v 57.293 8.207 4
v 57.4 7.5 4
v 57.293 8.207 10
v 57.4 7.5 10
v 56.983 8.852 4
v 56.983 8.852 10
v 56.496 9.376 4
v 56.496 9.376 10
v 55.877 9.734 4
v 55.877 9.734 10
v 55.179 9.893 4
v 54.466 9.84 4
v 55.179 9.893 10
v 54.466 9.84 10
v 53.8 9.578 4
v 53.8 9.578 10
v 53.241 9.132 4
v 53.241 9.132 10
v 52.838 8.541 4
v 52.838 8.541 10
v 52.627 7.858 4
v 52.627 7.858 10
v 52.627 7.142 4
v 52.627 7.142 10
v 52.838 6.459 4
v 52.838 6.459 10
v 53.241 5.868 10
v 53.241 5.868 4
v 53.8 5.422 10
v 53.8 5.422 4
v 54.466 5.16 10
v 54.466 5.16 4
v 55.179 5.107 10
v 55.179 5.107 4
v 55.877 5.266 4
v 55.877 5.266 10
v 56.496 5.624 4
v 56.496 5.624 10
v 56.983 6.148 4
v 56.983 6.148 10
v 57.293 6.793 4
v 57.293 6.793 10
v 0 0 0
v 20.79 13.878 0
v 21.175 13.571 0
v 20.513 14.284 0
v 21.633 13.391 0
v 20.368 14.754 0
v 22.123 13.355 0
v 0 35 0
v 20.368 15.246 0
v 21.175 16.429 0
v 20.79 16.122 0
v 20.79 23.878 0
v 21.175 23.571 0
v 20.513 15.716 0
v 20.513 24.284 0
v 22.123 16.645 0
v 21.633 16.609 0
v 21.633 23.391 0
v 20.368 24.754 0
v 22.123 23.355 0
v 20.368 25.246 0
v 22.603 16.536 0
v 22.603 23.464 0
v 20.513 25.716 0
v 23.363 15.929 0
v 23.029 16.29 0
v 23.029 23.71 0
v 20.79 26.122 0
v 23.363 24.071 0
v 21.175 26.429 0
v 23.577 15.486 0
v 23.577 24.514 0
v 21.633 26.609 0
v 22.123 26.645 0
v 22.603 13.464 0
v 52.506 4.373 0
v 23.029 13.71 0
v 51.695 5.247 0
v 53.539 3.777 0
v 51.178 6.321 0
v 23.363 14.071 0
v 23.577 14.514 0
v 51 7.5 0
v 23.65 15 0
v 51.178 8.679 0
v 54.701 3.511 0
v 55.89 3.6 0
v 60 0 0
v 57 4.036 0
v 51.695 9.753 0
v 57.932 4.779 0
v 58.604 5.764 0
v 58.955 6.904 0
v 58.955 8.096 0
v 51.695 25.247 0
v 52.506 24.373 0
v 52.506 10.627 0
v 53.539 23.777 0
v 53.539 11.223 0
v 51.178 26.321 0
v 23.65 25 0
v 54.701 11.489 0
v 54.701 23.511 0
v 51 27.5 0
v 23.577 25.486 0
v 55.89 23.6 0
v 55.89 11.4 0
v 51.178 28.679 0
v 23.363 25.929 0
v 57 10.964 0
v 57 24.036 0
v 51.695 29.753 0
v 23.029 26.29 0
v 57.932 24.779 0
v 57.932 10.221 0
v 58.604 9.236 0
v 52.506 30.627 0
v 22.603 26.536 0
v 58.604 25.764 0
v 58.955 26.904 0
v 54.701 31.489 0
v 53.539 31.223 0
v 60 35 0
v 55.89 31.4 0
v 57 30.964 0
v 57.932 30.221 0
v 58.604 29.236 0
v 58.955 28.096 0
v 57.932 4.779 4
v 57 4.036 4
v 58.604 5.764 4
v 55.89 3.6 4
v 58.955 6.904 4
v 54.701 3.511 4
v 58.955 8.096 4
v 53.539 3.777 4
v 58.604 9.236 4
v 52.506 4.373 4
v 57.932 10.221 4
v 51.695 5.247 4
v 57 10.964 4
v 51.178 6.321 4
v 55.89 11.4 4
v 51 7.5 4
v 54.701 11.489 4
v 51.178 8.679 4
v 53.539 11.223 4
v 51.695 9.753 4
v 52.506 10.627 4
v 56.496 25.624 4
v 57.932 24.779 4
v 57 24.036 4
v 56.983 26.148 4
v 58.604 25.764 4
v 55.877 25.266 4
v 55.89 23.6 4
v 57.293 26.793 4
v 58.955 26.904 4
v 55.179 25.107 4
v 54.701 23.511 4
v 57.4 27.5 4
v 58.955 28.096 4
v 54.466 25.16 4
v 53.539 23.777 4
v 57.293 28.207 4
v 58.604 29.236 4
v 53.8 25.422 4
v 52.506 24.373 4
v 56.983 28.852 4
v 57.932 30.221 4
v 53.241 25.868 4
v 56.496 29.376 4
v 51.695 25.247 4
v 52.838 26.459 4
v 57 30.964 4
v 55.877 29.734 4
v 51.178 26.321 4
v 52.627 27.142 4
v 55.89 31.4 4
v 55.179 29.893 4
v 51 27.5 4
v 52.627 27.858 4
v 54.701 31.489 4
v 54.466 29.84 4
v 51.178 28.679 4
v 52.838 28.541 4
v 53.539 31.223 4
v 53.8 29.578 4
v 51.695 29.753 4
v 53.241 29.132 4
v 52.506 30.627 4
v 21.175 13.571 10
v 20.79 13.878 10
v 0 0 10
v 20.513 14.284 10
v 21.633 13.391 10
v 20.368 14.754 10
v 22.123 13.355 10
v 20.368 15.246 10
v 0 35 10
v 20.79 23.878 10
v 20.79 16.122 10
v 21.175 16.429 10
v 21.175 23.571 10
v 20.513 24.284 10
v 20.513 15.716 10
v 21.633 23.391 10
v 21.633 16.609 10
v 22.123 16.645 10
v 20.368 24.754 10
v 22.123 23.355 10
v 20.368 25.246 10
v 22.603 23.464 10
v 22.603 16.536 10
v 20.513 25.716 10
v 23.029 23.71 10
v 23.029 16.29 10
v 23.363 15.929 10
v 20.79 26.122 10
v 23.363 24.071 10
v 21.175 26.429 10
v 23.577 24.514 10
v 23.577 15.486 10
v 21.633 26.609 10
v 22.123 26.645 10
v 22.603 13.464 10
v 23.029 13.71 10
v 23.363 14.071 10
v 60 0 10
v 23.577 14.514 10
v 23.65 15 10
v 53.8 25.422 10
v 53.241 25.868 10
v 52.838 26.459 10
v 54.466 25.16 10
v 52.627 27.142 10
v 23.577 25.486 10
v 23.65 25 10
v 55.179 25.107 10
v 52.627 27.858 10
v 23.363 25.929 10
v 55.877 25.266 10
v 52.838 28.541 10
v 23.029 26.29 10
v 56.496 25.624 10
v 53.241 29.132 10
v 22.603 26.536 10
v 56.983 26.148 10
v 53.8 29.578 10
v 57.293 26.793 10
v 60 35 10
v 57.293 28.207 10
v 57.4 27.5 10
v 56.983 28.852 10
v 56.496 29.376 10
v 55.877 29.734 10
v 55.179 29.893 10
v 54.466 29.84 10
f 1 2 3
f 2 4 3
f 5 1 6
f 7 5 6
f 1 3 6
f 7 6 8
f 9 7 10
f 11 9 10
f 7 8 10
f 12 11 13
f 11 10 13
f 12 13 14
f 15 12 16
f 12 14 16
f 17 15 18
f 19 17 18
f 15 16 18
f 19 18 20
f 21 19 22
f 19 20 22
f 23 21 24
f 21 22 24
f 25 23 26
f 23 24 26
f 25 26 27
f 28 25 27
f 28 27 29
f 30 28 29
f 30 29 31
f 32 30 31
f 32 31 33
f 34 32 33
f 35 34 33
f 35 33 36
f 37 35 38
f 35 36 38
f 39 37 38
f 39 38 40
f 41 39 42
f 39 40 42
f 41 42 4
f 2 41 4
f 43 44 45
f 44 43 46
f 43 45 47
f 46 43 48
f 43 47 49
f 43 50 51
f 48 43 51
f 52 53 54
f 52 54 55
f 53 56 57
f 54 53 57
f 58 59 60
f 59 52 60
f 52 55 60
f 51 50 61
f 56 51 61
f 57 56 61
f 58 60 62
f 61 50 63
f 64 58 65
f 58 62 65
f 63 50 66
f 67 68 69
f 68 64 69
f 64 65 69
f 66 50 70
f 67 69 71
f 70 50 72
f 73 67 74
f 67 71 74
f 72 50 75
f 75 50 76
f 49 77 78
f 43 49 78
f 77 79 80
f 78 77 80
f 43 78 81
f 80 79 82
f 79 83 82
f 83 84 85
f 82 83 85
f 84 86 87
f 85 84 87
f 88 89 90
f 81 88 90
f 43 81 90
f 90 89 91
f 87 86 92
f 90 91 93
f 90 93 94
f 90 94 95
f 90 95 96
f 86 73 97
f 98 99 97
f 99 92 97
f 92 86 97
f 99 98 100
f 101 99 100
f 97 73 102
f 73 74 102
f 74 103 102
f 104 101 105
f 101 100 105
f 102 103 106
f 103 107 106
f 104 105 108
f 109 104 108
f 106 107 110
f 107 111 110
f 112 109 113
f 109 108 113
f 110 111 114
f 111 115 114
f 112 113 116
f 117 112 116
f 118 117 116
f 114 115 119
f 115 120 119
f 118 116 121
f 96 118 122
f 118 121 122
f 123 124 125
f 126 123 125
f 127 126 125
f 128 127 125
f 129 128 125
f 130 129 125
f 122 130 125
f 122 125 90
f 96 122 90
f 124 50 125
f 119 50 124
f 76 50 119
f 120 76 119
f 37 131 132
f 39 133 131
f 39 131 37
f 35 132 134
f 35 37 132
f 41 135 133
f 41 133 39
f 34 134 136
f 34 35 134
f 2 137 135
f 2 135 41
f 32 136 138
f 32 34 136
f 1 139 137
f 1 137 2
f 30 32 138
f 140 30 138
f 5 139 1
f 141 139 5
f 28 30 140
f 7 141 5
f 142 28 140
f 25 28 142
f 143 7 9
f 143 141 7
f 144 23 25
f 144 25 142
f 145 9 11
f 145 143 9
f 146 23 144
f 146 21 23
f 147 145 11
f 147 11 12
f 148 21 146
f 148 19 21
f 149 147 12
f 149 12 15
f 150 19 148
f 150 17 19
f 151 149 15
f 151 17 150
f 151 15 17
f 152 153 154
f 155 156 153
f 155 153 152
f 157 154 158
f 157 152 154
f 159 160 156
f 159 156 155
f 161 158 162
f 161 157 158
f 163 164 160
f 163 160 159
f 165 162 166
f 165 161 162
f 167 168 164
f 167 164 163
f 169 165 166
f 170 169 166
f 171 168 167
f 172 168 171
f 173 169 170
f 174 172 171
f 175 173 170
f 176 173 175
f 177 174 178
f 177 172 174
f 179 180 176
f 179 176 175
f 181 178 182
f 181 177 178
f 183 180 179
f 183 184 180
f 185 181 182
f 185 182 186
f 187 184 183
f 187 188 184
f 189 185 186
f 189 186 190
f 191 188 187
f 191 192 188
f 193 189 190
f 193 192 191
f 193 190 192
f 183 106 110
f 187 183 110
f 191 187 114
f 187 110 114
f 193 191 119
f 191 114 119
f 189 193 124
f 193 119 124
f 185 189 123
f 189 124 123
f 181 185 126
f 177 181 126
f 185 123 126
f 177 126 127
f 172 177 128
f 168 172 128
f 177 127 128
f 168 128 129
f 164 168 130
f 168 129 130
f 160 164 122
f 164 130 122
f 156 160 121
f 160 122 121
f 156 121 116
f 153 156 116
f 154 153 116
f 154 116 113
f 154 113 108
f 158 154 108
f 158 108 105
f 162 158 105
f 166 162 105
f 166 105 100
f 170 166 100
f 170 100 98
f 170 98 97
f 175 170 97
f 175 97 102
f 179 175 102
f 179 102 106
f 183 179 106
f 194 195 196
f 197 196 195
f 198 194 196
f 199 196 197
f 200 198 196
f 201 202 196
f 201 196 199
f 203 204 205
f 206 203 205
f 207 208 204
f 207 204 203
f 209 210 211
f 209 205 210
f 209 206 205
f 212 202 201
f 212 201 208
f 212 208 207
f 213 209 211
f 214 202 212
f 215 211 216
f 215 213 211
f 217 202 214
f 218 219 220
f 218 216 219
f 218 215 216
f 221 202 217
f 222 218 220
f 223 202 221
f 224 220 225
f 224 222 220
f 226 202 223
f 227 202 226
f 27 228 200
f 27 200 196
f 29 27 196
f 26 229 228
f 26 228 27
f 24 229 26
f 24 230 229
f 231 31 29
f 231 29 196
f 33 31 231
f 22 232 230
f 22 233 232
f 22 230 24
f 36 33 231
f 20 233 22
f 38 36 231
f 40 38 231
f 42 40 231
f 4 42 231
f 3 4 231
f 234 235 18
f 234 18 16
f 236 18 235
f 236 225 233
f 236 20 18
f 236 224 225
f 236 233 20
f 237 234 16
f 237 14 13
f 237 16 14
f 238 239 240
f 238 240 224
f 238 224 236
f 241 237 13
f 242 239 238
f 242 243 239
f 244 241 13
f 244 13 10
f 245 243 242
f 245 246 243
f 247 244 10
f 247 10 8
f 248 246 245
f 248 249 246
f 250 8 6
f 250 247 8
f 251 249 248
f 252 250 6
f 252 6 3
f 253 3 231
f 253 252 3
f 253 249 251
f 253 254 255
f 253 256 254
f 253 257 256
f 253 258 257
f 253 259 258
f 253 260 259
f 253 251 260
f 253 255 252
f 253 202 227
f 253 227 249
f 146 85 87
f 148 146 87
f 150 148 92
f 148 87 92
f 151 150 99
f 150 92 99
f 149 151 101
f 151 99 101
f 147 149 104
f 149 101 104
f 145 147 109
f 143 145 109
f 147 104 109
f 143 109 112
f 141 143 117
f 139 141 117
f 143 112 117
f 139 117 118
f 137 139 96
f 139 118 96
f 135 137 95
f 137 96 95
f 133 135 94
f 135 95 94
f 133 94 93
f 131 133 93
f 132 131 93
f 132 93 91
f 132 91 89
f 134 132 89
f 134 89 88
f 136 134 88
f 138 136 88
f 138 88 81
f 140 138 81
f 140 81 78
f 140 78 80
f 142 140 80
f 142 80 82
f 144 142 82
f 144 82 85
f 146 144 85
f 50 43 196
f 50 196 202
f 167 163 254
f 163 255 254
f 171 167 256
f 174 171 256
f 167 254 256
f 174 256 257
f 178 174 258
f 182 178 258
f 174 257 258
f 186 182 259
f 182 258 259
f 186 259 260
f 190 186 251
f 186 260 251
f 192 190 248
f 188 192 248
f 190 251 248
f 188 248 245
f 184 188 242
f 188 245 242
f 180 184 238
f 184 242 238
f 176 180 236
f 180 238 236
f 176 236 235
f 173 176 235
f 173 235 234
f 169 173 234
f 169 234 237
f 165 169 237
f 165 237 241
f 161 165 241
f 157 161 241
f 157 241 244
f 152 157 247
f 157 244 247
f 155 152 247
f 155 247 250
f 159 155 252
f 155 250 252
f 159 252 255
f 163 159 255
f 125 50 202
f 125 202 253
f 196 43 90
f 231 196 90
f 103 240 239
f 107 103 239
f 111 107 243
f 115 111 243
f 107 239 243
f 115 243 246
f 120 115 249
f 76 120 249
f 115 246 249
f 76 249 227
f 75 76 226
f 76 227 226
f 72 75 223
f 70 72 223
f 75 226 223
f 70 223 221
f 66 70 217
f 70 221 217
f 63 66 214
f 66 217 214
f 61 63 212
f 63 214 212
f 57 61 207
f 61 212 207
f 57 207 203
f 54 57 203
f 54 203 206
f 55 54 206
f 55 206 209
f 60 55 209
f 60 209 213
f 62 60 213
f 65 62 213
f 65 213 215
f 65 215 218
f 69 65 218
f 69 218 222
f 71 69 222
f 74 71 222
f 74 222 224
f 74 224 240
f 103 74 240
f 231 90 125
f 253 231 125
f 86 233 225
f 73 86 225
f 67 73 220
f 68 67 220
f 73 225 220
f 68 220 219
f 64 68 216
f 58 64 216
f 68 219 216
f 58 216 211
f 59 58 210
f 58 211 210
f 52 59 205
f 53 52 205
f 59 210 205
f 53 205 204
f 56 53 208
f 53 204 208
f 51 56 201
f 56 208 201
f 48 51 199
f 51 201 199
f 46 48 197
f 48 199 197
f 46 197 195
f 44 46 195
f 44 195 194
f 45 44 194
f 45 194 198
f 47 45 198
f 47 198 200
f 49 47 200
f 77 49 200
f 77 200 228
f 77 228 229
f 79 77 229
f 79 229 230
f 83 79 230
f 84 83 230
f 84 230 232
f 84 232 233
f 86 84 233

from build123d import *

# Parameters (mm, degrees)
SKETCH_1_W                   = 60
SKETCH_1_H                   = 35
EXTRUDE_1_DEPTH              = 10
HOLE_WIZARD_M4_1_D           = 4.8
HOLE_WIZARD_M4_1_CBORE_D     = 8
HOLE_WIZARD_M4_1_CBORE_DEPTH = 4
HOLE_WIZARD_M4_1_2_D         = 3.3


with BuildPart() as part:
    # 草图1 → 凸台-拉伸1 (new body)
    with BuildSketch(Plane.XY):
        with Locations((30, 17.5)):
            Rectangle(SKETCH_1_W, SKETCH_1_H)
    extrude(amount=EXTRUDE_1_DEPTH)

    # Hole Wizard M4 _1 (through all)
    with Locations(Plane(origin=(0, 0, 0), x_dir=(-1, 0, 0), z_dir=(0, 0, -1))):
        with Locations((-55, 7.5), (-55, 27.5)):
            CounterBoreHole(HOLE_WIZARD_M4_1_D / 2, HOLE_WIZARD_M4_1_CBORE_D / 2, HOLE_WIZARD_M4_1_CBORE_DEPTH)

    # Hole Wizard M4 _1 2 (through all)
    with Locations(Plane(origin=(0, 0, 0), x_dir=(-1, 0, 0), z_dir=(0, 0, -1))):
        with Locations((-22, 25), (-22, 15)):
            Hole(HOLE_WIZARD_M4_1_2_D / 2)


solid = part.part
